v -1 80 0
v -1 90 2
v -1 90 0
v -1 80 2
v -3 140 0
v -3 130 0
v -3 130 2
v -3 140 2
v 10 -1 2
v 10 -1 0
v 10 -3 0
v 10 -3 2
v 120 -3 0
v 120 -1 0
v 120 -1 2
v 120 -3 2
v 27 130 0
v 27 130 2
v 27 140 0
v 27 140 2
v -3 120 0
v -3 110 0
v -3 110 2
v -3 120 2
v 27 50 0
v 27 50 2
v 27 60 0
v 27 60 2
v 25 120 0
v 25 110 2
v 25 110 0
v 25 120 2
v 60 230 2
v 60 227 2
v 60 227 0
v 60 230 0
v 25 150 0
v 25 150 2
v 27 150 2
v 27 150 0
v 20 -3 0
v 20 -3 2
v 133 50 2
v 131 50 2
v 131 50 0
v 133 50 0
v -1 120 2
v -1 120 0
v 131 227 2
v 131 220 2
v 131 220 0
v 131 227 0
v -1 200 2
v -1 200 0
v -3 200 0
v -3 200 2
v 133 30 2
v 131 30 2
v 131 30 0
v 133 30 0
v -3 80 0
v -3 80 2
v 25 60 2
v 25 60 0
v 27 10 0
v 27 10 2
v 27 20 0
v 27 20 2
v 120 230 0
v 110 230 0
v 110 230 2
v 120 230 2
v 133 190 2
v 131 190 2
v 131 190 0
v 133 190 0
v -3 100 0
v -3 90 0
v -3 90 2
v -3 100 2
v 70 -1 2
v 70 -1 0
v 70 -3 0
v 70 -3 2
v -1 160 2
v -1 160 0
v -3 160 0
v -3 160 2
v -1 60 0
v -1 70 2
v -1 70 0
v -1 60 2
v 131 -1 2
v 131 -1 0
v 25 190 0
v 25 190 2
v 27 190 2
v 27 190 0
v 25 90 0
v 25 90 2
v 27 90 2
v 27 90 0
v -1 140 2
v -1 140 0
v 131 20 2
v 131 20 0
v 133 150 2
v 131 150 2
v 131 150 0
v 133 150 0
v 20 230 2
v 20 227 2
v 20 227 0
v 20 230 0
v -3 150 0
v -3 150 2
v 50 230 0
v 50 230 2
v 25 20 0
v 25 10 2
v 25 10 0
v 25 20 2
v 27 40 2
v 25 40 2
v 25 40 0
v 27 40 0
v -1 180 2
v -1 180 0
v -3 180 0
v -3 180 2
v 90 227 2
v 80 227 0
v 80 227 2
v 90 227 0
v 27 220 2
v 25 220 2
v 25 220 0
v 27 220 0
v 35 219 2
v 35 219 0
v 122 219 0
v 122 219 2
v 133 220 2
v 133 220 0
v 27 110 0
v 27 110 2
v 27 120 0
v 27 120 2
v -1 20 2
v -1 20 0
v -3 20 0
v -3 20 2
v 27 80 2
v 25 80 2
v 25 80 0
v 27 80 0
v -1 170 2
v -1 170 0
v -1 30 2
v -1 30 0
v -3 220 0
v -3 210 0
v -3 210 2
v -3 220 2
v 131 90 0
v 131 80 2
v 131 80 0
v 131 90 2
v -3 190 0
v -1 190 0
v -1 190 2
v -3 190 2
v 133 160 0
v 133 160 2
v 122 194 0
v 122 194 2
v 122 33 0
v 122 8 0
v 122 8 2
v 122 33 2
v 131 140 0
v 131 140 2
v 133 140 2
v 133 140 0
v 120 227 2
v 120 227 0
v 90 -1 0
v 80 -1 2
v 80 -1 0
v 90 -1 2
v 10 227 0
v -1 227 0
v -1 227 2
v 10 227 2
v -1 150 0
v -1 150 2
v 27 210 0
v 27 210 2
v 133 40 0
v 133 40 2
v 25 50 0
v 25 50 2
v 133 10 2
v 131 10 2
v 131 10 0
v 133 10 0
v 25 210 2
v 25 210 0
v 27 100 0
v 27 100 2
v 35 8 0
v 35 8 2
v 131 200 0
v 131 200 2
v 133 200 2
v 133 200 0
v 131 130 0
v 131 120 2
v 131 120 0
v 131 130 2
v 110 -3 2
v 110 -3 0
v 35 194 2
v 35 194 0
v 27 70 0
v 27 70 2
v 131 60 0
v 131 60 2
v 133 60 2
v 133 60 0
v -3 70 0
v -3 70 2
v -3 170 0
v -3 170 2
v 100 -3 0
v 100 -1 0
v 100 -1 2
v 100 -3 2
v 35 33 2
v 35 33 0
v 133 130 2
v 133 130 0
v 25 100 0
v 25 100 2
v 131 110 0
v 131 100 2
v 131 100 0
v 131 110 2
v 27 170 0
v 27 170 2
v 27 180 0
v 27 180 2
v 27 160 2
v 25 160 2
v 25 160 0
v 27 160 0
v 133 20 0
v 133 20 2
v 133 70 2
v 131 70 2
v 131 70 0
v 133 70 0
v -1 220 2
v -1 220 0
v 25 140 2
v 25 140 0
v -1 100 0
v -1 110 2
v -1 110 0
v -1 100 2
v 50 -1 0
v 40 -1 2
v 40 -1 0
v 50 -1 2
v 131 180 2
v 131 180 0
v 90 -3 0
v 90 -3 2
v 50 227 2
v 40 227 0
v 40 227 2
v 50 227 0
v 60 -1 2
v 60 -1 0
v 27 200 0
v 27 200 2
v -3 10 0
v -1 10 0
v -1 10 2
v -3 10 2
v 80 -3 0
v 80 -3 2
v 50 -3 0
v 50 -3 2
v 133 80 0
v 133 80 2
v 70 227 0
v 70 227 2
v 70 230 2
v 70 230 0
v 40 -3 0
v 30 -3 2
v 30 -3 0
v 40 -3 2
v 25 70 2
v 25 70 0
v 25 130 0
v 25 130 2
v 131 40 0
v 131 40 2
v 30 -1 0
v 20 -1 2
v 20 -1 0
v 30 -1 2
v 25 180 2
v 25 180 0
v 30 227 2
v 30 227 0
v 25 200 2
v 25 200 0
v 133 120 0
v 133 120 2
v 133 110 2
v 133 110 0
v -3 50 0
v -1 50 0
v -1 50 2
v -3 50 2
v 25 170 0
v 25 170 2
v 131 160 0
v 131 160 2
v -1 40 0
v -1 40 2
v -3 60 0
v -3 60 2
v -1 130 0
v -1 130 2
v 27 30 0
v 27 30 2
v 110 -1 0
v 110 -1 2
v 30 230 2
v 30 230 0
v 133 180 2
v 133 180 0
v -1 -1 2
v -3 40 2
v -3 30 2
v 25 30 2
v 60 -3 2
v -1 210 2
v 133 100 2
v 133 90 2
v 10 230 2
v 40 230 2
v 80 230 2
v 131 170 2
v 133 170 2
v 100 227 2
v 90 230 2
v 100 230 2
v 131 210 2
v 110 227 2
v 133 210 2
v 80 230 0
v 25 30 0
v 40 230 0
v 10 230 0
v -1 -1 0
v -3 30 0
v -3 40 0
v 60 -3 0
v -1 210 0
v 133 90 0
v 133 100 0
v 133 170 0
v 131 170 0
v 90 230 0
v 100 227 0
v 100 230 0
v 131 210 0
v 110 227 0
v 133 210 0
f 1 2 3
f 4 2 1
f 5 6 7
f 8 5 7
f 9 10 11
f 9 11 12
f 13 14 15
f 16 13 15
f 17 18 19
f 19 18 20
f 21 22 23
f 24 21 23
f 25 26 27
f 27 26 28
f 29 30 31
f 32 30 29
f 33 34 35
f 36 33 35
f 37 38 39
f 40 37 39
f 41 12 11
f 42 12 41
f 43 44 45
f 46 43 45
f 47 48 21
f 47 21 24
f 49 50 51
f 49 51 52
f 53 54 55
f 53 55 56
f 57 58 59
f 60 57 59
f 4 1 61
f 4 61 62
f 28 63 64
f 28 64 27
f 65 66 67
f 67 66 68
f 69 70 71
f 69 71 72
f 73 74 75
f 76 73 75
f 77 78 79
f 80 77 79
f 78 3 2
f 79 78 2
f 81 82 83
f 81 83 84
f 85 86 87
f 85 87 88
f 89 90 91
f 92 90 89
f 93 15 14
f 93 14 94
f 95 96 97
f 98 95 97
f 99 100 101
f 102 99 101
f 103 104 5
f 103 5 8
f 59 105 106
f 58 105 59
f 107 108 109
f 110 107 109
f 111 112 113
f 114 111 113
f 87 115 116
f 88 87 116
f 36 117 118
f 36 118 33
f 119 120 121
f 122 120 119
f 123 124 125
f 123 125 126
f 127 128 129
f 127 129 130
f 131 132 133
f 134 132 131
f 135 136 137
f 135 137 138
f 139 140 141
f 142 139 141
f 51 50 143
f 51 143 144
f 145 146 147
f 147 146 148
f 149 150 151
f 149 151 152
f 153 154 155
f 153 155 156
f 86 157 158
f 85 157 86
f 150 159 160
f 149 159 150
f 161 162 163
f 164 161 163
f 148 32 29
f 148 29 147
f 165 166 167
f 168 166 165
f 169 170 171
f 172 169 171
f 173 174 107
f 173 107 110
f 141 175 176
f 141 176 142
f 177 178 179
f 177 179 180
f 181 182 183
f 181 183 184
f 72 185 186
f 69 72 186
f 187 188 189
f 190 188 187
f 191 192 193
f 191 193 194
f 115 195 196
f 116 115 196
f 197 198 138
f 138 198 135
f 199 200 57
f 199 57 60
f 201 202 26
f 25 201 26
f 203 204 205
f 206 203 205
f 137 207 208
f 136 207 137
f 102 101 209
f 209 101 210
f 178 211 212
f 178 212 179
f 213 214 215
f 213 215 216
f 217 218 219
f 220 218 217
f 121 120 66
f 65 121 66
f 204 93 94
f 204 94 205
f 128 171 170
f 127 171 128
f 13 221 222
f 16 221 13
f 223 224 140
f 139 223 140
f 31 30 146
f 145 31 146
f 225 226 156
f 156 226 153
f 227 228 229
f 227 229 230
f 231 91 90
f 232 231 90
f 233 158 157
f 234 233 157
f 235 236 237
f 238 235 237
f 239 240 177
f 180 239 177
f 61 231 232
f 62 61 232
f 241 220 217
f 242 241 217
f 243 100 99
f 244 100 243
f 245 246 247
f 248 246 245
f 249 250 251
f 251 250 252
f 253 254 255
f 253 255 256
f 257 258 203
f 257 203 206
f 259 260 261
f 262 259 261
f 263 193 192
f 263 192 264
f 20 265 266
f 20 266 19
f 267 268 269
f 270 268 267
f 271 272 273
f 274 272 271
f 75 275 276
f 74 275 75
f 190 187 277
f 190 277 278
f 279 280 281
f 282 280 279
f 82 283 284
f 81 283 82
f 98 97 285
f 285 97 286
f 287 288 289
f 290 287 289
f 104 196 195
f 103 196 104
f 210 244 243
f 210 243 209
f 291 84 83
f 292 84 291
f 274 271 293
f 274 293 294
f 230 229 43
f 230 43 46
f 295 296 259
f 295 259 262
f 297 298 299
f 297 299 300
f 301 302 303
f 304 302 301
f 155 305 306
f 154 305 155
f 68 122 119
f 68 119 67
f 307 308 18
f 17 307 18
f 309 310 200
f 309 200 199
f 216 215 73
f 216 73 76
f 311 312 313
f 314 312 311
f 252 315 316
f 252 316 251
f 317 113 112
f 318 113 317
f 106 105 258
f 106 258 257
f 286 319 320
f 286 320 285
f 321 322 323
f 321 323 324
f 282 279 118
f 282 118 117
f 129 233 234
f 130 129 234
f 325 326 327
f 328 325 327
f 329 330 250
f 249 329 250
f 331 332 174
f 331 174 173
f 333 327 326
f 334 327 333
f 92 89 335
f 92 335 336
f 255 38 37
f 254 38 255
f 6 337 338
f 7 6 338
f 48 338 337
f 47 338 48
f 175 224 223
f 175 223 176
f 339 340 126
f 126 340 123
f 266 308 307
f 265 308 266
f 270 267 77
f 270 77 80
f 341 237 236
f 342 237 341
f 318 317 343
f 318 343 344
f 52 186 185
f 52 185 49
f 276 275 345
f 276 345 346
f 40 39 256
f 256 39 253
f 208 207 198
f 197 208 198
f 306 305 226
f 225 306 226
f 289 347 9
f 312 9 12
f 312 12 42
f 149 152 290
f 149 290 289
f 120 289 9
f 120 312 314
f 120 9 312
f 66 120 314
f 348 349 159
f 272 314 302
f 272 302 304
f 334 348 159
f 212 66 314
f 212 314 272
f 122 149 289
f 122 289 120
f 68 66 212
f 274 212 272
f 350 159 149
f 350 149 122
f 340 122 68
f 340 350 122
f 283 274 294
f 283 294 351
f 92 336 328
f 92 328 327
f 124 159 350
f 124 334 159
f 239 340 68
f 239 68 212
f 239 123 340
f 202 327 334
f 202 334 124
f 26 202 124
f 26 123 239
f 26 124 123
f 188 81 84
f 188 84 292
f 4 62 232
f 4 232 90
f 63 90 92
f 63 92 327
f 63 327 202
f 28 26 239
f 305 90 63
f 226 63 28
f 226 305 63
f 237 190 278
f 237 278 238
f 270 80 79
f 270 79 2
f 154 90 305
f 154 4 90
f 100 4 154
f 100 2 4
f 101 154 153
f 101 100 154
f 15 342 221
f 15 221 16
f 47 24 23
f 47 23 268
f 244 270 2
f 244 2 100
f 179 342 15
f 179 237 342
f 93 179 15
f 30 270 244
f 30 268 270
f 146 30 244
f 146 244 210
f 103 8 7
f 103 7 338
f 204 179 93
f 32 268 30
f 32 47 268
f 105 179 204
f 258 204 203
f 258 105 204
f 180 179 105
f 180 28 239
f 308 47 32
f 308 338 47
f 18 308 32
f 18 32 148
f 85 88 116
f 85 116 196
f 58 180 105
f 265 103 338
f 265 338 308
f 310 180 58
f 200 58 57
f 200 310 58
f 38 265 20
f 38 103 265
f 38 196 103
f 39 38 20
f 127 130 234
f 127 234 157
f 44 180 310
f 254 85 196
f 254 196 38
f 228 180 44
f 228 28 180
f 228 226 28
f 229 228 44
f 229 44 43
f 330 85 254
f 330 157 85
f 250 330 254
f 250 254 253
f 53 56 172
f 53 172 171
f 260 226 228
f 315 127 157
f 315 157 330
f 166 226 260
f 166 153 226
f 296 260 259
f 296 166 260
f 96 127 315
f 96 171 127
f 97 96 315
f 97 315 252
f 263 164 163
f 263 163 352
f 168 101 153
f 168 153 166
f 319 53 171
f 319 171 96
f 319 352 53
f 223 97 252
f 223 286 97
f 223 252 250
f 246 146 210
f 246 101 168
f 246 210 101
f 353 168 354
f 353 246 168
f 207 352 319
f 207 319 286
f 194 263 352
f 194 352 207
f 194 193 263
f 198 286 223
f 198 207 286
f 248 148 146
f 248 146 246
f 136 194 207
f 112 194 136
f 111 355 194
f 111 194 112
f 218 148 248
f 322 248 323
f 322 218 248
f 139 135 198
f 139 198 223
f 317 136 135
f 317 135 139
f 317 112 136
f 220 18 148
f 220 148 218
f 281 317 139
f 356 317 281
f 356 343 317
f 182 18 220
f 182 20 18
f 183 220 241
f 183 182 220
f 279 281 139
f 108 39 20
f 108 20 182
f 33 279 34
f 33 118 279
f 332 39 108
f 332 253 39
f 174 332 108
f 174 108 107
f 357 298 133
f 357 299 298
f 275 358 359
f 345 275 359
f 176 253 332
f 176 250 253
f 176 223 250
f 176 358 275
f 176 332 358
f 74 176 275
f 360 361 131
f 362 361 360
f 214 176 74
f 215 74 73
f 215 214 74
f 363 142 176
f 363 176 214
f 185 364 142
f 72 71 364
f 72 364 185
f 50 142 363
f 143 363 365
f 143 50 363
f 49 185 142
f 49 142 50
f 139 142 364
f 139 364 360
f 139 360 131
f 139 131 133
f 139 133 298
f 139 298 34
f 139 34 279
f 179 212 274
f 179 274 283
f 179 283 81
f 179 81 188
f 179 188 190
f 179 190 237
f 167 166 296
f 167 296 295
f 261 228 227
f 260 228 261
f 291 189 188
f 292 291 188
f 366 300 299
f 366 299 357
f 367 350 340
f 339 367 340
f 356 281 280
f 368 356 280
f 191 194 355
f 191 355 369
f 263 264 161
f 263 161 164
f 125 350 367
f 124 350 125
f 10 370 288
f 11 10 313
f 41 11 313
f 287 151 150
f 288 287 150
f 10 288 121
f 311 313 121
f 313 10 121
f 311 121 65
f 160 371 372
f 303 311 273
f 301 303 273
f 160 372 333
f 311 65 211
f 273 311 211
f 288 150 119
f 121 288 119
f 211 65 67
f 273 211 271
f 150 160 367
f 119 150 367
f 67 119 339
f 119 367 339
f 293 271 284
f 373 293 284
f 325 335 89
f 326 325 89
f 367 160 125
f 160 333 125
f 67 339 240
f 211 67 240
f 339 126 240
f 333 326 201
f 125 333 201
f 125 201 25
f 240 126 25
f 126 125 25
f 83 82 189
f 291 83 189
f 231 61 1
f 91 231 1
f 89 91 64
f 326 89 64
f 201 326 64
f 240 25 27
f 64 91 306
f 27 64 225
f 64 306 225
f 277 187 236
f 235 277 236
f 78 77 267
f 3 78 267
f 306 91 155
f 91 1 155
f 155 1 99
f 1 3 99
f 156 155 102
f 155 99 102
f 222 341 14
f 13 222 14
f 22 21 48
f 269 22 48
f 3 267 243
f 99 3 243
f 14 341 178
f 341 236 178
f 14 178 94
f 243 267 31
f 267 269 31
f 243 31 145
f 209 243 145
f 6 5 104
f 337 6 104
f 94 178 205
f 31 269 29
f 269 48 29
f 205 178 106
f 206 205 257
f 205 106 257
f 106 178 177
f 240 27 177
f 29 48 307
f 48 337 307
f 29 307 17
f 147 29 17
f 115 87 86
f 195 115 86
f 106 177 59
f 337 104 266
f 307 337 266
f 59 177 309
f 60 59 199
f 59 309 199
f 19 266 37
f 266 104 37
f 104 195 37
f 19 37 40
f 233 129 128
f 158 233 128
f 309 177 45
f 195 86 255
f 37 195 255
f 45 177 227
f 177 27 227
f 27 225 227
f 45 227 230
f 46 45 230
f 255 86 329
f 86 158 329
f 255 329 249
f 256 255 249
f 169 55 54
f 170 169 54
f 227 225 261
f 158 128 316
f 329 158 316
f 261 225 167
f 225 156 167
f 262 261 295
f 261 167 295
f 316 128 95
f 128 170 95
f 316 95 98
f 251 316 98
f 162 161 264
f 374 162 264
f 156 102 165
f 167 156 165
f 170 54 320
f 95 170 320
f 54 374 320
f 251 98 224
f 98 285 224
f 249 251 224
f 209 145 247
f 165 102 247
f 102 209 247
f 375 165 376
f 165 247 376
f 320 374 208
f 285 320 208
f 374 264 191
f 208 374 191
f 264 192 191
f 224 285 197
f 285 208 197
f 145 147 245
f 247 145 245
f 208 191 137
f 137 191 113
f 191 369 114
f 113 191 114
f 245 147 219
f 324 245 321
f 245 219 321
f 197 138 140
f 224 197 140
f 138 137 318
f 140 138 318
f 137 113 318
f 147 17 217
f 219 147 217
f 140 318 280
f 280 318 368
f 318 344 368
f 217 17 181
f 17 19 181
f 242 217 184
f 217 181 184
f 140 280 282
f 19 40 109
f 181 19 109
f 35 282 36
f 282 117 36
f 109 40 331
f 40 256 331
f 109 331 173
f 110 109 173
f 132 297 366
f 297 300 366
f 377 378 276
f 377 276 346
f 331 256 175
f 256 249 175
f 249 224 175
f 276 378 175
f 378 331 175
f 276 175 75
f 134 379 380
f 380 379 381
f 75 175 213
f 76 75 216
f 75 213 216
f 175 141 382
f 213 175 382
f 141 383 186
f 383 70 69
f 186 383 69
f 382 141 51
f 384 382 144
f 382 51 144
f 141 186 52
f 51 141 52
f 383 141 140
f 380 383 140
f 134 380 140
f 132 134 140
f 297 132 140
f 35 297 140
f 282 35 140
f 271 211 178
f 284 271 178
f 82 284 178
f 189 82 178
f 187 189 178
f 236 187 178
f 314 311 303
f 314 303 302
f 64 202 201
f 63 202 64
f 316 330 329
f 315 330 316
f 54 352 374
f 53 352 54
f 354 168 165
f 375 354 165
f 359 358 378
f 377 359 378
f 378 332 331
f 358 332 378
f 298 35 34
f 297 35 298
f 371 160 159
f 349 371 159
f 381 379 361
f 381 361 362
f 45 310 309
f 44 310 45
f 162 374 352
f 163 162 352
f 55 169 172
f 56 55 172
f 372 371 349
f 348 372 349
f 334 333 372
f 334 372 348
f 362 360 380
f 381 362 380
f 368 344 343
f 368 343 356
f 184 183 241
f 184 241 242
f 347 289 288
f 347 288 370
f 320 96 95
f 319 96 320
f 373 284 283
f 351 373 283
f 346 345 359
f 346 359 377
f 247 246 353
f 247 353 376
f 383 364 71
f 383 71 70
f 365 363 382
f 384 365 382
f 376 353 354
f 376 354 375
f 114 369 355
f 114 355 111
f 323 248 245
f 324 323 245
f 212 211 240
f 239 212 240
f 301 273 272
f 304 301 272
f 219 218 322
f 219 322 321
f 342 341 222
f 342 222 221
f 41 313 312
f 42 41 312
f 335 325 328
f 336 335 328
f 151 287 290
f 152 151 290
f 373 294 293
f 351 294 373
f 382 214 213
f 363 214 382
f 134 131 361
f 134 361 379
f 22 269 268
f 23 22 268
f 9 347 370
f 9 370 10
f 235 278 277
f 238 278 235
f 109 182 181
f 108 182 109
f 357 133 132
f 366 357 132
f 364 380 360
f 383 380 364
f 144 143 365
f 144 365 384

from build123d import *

# Parameters (mm, degrees)
SKETCH1_W           = 130
SKETCH1_H           = 227
SKETCH1_W_2         = 87
SKETCH1_H_2         = 25
BOSS_EXTRUDE1_DEPTH = 2
SKETCH2_W           = 10
SKETCH2_H           = 2
BOSS_EXTRUDE2_DEPTH = 3
LPATTERN1_COUNT     = 6
LPATTERN1_PITCH     = 20
SKETCH3_W           = 10
SKETCH3_H           = 2
BOSS_EXTRUDE3_DEPTH = 3
LPATTERN2_COUNT     = 6
LPATTERN2_PITCH     = 20
SKETCH4_W           = 2
SKETCH4_H           = 10
BOSS_EXTRUDE4_DEPTH = 3
LPATTERN3_COUNT     = 11
LPATTERN3_PITCH     = 20
SKETCH5_W           = 2
SKETCH5_H           = 10
BOSS_EXTRUDE5_DEPTH = 3
LPATTERN4_COUNT     = 11
LPATTERN4_PITCH     = 20
SKETCH6_W           = 3
SKETCH6_H           = 10
CUT_EXTRUDE1_DEPTH  = 3
LPATTERN5_COUNT     = 11
LPATTERN5_PITCH     = 20
ESQUISSE1_W         = 1
ESQUISSE1_H         = 210
ESQUISSE1_H_2       = 227
BOSS_EXTRU_1_DEPTH  = 2


with BuildPart() as part:
    # Sketch1 → Boss-Extrude1 (new body)
    with BuildSketch(Plane.XY):
        with Locations((65, 113.5)):
            Rectangle(SKETCH1_W, SKETCH1_H)
        with Locations((78.5, 20.5)):
            Rectangle(SKETCH1_W_2, SKETCH1_H_2, mode=Mode.SUBTRACT)
        with Locations((78.5, 206.5)):
            Rectangle(SKETCH1_W_2, SKETCH1_H_2, mode=Mode.SUBTRACT)
    extrude(amount=BOSS_EXTRUDE1_DEPTH)

    # Sketch2 → Boss-Extrude2 (add)
    with BuildSketch(Plane.XZ):
        with Locations((15, 1)):
            Rectangle(SKETCH2_W, SKETCH2_H)
    boss_extrude2 = extrude(amount=BOSS_EXTRUDE2_DEPTH)

    # LPattern1: Boss-Extrude2 ×6
    with Locations(*[(i * LPATTERN1_PITCH, 0, 0) for i in range(1, LPATTERN1_COUNT)]):
        add(boss_extrude2)

    # Sketch3 → Boss-Extrude3 (add)
    with BuildSketch(Plane(origin=(0, 227, 0), x_dir=(1, 0, 0), z_dir=(0, 1, 0))):
        with Locations((15, -1)):
            Rectangle(SKETCH3_W, SKETCH3_H)
    boss_extrude3 = extrude(amount=BOSS_EXTRUDE3_DEPTH)

    # LPattern2: Boss-Extrude3 ×6
    with Locations(*[(i * LPATTERN2_PITCH, 0, 0) for i in range(1, LPATTERN2_COUNT)]):
        add(boss_extrude3)

    # Sketch4 → Boss-Extrude4 (add)
    with BuildSketch(Plane(origin=(130, 0, 0), x_dir=(0, 0, -1), z_dir=(1, 0, 0))):
        with Locations((-1, 15)):
            Rectangle(SKETCH4_W, SKETCH4_H)
    boss_extrude4 = extrude(amount=BOSS_EXTRUDE4_DEPTH)

    # LPattern3: Boss-Extrude4 ×11
    with Locations(*[(0, i * LPATTERN3_PITCH, 0) for i in range(1, LPATTERN3_COUNT)]):
        add(boss_extrude4)

    # Sketch5 → Boss-Extrude5 (add)
    with BuildSketch(Plane.ZY):
        with Locations((1, 15)):
            Rectangle(SKETCH5_W, SKETCH5_H)
    boss_extrude5 = extrude(amount=BOSS_EXTRUDE5_DEPTH)

    # LPattern4: Boss-Extrude5 ×11
    with Locations(*[(0, i * LPATTERN4_PITCH, 0) for i in range(1, LPATTERN4_COUNT)]):
        add(boss_extrude5)

    # Sketch6 → Cut-Extrude1 (cut)
    with BuildSketch(Plane.XY.offset(2)):
        with Locations((26.5, 15)):
            Rectangle(SKETCH6_W, SKETCH6_H)
    cut_extrude1 = extrude(amount=-CUT_EXTRUDE1_DEPTH, mode=Mode.SUBTRACT)

    # LPattern5: Cut-Extrude1 ×11
    with Locations(*[(0, i * LPATTERN5_PITCH, 0) for i in range(1, LPATTERN5_COUNT)]):
        add(cut_extrude1, mode=Mode.SUBTRACT)

    # Esquisse1 → Boss.-Extru.1 (add)
    with BuildSketch(Plane.XY.offset(2)):
        Polygon((130, 0), (0, 0), (-1, 0), (-1, -1), (130, -1), align=None)
        with Locations((27.5, 115)):
            Rectangle(ESQUISSE1_W, ESQUISSE1_H)
        with Locations((-0.5, 113.5)):
            Rectangle(ESQUISSE1_W, ESQUISSE1_H_2)
        Polygon((130, 227), (130, 0), (130, -1), (131, -1), (131, 227), align=None)
    extrude(amount=-BOSS_EXTRU_1_DEPTH)


solid = part.part
